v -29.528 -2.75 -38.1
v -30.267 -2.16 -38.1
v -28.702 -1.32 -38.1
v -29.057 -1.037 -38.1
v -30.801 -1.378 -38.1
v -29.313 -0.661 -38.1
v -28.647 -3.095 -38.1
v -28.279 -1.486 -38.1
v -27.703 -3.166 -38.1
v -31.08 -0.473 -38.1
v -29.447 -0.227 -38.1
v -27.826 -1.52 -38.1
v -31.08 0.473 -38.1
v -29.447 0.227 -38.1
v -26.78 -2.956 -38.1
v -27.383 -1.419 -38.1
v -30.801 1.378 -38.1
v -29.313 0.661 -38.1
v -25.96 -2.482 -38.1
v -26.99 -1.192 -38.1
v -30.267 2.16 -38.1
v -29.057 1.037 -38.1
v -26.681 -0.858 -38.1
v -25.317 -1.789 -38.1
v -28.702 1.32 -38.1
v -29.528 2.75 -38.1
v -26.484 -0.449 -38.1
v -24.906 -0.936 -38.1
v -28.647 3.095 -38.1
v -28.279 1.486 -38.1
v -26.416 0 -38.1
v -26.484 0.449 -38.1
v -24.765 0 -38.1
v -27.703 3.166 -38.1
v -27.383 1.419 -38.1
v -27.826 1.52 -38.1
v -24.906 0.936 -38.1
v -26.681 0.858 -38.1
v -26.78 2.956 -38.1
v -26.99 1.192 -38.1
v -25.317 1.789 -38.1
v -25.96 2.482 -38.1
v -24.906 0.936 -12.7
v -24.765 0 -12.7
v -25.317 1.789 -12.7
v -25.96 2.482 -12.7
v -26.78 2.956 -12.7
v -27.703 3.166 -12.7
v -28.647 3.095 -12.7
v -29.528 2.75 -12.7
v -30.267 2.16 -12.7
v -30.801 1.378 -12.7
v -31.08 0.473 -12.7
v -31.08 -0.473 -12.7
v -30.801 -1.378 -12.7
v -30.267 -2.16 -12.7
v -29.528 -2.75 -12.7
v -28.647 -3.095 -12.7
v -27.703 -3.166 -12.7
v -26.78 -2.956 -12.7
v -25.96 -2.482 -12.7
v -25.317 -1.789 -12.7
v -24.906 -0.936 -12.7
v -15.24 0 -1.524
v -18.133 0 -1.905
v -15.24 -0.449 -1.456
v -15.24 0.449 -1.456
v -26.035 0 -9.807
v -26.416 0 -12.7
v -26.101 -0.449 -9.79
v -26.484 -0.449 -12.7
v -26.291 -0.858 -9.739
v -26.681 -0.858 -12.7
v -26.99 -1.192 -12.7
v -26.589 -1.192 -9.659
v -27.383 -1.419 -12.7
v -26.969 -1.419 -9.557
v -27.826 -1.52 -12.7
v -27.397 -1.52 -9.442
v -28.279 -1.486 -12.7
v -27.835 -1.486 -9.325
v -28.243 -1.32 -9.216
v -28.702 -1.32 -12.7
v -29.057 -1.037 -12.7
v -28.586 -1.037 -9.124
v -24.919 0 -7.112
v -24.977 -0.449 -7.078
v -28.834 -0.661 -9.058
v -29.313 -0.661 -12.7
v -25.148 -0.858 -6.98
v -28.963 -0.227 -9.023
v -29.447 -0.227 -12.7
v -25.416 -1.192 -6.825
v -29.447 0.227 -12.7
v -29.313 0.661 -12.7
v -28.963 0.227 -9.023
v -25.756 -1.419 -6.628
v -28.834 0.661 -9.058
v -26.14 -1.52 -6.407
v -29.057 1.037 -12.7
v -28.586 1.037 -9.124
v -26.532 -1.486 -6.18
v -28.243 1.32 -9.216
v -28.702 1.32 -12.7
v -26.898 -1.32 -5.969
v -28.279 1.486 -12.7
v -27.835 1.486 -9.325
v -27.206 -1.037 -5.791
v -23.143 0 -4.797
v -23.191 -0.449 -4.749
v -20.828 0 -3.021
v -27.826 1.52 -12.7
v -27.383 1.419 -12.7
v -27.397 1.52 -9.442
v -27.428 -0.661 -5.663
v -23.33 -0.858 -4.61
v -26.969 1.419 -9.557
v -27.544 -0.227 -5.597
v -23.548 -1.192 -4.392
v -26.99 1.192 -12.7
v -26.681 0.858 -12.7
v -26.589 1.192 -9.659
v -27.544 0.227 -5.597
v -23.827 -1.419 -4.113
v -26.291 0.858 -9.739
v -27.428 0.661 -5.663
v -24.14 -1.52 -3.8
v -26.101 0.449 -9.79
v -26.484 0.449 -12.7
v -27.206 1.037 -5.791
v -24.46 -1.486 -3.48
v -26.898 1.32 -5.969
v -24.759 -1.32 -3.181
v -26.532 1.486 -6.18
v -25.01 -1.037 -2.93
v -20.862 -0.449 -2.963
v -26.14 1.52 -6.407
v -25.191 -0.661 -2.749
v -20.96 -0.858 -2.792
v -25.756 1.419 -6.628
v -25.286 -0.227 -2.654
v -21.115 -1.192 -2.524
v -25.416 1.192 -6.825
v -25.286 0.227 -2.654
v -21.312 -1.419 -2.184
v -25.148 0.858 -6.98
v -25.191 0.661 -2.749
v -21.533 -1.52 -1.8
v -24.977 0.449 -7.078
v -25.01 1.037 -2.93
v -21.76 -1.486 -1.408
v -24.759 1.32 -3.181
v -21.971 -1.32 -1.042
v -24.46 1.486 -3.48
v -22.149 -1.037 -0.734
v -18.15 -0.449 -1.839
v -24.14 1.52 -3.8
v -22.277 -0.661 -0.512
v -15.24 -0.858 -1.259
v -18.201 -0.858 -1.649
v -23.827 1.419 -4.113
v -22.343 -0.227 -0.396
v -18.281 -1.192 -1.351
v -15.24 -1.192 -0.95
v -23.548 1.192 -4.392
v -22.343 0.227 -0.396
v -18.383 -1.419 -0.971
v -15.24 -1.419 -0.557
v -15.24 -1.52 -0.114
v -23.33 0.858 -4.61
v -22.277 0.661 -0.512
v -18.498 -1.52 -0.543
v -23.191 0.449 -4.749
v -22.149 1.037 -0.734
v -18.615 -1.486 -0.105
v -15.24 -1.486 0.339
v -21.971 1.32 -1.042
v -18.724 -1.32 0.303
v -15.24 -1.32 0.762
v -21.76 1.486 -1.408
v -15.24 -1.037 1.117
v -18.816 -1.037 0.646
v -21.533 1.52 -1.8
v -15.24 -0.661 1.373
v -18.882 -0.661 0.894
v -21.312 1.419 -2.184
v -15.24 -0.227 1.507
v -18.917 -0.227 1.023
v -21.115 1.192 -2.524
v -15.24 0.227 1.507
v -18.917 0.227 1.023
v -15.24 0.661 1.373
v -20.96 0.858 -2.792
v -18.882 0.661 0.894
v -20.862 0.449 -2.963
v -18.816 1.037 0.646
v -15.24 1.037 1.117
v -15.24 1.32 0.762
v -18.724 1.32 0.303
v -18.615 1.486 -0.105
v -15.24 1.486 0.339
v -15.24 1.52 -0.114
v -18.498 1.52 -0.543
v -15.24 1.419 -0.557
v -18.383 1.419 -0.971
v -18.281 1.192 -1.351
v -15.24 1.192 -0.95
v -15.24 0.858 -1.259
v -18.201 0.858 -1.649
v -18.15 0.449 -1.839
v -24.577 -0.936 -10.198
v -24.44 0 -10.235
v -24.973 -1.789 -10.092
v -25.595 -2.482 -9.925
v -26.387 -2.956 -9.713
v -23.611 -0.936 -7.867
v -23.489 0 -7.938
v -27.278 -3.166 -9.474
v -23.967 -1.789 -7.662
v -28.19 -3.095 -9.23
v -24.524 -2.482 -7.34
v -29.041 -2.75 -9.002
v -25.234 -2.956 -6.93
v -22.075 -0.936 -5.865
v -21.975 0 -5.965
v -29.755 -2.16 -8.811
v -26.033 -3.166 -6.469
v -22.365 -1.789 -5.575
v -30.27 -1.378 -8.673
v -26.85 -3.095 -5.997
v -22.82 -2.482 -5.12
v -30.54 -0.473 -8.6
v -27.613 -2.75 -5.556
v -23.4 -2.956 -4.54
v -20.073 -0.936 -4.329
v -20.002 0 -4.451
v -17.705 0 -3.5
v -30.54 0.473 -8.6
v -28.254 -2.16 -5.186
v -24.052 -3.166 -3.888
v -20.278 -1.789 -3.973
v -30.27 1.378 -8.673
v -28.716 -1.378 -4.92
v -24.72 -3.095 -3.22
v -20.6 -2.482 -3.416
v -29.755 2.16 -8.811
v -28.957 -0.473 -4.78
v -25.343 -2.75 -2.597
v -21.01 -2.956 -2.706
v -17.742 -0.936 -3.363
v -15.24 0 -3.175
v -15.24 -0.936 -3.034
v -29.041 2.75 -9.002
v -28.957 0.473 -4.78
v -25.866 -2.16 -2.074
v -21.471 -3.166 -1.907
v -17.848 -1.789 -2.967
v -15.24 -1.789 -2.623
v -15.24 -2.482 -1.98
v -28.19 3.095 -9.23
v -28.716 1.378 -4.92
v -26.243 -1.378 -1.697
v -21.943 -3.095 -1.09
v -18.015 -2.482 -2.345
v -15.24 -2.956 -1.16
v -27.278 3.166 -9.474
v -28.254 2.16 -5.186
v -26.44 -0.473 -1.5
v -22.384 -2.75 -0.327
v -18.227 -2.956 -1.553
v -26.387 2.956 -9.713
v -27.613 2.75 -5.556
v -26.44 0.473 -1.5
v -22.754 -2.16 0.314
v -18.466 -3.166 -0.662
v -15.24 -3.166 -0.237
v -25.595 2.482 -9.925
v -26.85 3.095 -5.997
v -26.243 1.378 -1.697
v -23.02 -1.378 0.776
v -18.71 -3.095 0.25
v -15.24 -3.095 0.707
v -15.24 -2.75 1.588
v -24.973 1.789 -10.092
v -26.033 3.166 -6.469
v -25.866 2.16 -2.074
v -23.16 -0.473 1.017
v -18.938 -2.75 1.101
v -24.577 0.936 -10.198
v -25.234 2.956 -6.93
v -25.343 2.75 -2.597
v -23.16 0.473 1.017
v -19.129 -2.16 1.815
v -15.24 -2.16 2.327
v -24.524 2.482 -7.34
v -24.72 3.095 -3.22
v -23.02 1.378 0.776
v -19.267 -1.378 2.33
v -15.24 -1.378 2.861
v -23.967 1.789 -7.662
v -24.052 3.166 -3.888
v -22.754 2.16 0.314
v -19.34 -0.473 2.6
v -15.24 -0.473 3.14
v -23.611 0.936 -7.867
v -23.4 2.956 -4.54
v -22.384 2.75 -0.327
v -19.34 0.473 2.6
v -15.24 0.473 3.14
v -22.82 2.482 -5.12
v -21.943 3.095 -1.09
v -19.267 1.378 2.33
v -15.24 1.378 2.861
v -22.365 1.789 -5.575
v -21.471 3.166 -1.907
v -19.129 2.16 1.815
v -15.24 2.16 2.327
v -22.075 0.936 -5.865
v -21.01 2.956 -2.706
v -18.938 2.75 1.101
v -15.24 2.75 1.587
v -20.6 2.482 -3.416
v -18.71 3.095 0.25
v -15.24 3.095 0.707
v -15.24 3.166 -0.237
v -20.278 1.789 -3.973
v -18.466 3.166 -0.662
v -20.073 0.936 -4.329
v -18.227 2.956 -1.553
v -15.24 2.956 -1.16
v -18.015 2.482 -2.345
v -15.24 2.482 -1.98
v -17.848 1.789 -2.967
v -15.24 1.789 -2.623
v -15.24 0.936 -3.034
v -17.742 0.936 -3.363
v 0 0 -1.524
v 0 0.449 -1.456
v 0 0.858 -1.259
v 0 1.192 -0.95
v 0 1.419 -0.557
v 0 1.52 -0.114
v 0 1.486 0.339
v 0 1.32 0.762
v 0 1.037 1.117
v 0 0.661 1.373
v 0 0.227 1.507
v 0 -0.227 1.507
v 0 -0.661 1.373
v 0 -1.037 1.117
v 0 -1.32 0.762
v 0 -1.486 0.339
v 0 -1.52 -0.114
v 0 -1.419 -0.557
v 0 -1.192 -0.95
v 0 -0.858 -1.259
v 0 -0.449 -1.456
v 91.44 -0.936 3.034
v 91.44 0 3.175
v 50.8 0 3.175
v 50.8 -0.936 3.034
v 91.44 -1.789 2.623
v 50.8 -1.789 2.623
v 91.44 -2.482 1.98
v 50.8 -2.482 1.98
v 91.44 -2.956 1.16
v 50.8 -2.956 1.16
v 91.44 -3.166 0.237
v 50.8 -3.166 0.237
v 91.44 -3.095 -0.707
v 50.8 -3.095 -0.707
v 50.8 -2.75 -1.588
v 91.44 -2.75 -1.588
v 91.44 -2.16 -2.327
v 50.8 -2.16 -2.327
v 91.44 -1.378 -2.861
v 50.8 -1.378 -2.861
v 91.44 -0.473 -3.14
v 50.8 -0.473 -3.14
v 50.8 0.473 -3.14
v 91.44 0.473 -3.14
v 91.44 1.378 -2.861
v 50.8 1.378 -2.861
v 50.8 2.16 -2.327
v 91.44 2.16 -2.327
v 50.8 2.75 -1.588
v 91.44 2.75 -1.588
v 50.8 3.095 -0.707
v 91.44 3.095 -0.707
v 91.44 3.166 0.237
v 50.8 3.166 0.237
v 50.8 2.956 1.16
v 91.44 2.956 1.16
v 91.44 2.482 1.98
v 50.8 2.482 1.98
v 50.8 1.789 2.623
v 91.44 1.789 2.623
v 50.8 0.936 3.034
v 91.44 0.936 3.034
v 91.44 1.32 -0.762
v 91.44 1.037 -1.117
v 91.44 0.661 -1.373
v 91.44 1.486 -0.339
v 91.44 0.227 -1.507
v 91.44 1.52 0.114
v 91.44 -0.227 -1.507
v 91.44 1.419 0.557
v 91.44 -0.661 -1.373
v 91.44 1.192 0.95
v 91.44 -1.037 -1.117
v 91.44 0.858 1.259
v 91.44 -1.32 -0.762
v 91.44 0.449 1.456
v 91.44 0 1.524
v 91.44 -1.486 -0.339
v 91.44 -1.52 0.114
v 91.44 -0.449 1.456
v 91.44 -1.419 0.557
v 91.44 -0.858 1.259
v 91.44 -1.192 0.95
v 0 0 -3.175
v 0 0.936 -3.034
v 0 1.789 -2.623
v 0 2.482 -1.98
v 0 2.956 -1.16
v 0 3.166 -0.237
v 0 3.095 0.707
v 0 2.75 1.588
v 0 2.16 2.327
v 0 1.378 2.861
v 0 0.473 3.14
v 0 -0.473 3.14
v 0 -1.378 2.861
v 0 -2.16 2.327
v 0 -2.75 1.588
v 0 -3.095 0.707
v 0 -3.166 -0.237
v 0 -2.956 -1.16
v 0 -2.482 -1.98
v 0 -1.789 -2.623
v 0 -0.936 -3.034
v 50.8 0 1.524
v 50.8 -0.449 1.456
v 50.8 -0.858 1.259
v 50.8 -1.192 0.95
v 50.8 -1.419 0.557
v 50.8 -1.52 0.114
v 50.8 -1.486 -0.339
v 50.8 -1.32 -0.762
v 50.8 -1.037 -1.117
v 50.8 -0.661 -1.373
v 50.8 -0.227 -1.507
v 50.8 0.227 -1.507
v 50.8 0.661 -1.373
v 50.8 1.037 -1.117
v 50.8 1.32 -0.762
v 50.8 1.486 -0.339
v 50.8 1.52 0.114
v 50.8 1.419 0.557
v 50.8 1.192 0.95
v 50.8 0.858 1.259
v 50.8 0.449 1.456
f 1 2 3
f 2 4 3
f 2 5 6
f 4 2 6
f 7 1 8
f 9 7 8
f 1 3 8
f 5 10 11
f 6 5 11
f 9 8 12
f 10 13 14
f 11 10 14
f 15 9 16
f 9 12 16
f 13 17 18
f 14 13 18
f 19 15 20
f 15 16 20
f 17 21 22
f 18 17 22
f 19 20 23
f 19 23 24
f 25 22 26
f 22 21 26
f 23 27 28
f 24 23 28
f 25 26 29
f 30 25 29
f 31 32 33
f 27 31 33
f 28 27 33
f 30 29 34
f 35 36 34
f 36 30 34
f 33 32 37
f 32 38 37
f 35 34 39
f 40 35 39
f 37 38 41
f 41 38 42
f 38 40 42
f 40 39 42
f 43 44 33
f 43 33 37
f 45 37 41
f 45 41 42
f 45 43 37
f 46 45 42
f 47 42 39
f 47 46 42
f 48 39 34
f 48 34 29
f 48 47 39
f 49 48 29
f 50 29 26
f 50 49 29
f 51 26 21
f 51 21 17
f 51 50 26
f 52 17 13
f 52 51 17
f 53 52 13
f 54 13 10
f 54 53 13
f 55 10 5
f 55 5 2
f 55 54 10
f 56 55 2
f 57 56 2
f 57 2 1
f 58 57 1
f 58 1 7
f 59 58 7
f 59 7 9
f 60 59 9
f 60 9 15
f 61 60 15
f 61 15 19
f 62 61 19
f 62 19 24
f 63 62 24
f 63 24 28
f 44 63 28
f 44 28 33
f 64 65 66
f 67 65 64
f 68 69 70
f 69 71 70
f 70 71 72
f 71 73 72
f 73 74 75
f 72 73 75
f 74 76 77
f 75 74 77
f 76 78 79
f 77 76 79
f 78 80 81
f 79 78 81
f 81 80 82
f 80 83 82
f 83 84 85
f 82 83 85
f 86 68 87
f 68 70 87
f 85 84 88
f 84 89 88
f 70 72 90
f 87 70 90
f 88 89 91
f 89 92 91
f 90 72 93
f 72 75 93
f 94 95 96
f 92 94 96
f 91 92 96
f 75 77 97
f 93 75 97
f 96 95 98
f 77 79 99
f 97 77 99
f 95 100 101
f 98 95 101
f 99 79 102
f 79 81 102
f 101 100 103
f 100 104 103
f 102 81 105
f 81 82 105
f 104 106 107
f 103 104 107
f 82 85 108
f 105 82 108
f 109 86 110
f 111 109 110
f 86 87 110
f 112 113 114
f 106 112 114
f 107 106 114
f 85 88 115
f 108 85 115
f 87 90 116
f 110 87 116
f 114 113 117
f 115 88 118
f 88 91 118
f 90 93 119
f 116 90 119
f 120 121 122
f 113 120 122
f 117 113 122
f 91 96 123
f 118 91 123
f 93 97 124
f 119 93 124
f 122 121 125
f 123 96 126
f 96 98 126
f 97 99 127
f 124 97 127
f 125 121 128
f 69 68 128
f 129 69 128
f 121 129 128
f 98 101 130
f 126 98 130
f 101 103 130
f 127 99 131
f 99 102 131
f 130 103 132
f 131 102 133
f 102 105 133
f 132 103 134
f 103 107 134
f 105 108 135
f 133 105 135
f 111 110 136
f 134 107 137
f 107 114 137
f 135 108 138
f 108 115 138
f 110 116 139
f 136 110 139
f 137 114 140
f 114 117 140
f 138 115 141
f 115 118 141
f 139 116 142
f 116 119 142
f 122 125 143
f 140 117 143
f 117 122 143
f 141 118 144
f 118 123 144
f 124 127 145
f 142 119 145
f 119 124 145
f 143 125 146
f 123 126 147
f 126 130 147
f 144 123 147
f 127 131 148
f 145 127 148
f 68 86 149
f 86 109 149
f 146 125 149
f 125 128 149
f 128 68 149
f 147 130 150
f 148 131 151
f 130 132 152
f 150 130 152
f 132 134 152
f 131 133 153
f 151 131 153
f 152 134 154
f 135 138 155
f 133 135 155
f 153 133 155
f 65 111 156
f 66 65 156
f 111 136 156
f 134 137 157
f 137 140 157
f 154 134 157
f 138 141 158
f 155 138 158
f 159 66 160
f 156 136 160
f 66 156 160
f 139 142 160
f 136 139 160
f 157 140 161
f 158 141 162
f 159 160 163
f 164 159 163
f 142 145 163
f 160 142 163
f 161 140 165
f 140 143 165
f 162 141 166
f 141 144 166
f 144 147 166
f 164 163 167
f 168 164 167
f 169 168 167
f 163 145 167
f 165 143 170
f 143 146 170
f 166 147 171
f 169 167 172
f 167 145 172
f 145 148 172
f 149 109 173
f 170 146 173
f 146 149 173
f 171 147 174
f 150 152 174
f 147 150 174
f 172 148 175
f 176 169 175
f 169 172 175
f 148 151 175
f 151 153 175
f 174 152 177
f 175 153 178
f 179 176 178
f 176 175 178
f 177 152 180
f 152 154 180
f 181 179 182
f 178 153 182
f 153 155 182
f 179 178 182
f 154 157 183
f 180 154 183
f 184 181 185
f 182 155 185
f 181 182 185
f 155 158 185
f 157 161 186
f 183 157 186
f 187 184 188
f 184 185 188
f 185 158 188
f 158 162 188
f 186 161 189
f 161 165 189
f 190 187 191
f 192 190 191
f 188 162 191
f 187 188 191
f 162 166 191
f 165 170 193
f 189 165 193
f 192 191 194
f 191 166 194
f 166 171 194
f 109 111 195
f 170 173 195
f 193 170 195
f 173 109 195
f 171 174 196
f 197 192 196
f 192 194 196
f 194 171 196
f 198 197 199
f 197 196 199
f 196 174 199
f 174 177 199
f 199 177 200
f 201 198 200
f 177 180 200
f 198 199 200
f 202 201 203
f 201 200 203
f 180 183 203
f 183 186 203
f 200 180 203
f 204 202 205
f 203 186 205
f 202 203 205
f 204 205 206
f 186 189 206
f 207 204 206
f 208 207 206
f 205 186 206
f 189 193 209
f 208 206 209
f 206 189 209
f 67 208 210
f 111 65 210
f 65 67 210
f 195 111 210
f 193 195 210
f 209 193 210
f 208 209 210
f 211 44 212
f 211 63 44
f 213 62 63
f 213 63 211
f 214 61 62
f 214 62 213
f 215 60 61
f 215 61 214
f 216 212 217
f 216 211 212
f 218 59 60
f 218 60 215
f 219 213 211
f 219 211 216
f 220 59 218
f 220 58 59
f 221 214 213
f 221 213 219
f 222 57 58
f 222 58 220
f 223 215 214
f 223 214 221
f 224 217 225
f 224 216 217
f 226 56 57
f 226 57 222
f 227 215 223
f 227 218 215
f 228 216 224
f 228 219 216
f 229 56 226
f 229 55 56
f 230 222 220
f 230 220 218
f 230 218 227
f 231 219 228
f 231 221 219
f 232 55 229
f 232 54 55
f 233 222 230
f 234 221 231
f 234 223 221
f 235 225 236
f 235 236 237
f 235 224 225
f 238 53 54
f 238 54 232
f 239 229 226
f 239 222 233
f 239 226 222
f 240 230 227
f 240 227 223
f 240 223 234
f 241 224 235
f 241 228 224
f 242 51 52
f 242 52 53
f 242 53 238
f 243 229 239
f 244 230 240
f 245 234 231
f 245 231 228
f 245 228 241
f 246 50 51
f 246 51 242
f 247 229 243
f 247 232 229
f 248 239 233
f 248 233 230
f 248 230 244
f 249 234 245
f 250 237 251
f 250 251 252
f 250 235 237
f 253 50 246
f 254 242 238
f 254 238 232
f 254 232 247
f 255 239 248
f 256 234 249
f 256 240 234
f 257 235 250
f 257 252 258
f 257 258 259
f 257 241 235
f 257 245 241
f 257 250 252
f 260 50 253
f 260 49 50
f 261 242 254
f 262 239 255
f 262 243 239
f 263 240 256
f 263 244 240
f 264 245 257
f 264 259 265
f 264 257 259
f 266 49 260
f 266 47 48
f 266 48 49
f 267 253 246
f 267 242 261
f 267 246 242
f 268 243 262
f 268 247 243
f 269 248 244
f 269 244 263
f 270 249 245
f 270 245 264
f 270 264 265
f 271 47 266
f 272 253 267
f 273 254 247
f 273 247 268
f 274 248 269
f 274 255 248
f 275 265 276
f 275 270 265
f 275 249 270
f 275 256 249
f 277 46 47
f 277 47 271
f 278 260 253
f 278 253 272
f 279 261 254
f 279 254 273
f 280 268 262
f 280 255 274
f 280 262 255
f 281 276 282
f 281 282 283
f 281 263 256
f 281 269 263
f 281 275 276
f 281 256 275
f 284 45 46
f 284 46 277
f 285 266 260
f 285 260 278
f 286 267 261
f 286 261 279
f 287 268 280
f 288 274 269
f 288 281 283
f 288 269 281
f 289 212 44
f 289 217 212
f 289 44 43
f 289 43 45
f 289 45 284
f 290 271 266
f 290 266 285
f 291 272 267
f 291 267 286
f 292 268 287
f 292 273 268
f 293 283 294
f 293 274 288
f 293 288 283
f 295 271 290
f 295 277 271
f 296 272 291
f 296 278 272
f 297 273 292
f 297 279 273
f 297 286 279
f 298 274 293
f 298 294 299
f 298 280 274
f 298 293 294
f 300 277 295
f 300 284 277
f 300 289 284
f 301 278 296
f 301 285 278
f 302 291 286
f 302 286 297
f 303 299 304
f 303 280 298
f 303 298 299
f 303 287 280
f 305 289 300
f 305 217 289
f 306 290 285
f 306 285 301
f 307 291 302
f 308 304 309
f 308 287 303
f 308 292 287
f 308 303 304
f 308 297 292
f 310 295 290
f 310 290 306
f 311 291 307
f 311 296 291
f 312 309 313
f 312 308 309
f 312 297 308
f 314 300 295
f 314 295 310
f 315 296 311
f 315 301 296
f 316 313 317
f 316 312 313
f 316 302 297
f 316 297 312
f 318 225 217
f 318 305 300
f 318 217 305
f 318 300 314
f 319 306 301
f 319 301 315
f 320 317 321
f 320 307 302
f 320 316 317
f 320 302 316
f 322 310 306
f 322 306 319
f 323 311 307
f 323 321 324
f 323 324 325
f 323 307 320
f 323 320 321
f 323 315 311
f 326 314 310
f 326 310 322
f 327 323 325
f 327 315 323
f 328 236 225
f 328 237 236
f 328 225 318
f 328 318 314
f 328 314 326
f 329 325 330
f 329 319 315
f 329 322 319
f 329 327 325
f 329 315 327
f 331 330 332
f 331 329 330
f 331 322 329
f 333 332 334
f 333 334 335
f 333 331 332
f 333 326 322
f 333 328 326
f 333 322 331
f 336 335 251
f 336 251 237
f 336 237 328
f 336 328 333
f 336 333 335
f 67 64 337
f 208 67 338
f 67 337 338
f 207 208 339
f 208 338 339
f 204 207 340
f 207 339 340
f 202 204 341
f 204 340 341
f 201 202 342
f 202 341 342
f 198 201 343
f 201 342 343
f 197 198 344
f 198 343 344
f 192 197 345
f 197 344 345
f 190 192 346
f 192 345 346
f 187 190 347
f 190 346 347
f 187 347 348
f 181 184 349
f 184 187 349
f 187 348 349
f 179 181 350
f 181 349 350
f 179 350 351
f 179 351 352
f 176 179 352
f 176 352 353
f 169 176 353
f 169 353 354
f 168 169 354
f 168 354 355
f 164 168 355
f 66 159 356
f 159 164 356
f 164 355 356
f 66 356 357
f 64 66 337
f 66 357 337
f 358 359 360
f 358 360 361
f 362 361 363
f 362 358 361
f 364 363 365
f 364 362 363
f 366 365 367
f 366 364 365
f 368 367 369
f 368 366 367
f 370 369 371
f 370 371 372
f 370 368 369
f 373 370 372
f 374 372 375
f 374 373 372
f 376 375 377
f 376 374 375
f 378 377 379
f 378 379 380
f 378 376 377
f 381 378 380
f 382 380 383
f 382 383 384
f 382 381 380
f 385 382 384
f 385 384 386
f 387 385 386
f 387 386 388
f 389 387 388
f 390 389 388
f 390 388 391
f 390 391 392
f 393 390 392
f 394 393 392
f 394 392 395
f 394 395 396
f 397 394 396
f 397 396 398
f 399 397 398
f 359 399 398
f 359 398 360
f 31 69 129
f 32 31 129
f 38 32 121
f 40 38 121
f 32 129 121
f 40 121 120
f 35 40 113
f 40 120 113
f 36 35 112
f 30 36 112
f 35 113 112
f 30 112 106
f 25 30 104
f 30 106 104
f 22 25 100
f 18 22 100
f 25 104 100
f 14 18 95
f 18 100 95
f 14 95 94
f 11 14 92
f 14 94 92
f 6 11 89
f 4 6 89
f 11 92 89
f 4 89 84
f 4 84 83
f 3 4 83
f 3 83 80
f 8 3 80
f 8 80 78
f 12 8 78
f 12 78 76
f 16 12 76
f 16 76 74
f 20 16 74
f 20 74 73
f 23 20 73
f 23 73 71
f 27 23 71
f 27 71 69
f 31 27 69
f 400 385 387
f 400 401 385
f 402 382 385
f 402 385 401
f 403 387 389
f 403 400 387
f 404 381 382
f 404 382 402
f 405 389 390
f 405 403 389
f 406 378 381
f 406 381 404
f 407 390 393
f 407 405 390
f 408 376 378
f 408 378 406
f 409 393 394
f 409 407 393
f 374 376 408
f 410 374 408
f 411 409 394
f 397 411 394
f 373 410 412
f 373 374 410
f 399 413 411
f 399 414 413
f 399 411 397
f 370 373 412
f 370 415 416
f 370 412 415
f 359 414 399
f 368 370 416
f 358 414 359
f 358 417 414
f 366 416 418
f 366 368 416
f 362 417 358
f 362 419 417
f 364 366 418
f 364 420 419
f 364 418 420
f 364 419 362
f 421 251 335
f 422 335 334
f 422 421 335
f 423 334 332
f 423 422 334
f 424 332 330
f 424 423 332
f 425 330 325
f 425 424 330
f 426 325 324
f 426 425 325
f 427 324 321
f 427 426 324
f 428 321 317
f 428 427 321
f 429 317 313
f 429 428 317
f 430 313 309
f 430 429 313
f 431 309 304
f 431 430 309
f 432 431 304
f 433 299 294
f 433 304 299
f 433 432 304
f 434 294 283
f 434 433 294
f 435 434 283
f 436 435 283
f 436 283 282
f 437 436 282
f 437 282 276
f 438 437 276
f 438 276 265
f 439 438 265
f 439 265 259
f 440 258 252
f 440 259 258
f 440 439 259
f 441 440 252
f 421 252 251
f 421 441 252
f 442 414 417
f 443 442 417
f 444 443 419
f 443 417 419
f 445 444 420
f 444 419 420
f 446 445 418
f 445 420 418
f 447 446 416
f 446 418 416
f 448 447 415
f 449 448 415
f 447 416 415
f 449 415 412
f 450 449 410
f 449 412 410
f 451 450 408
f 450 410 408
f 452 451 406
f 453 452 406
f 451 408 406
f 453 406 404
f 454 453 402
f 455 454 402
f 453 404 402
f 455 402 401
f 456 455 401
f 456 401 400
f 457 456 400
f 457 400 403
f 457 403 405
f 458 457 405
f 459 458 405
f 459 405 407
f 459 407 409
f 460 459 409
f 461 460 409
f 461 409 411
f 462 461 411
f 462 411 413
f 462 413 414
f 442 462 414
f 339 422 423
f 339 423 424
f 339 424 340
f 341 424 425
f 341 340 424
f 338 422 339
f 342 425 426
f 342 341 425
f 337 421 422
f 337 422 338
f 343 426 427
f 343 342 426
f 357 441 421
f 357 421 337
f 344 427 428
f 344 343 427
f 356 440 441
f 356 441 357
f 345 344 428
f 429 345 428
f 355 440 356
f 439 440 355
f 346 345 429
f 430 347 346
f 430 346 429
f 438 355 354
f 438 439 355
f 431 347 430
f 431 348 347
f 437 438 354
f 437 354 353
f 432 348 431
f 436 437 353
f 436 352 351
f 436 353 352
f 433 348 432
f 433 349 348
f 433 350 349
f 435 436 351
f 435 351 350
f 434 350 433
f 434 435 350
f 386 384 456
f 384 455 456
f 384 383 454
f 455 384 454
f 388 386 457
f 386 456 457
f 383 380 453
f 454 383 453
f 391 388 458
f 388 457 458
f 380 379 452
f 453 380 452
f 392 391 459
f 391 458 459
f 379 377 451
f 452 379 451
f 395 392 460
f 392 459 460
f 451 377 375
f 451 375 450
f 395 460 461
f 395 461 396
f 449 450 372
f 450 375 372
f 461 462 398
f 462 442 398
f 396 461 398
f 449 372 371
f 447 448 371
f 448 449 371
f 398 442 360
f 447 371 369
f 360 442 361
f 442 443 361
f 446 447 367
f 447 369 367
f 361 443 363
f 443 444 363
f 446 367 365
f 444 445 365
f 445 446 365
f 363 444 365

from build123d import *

# Parameters (mm, degrees)
SWEEP_THIN1_PROFILE_R   = 3.175
SWEEP_THIN1_PROFILE_R_2 = 1.524
SWEEP_THIN2_PROFILE_R   = 3.175
SWEEP_THIN2_PROFILE_R_2 = 1.524


with BuildPart() as part:
    # Sweep-Thin1: sweep along a path in Sketch1
    with BuildLine(Plane(origin=(0, 0, 0), x_dir=(1, 0, 0), z_dir=(0, 1, 0))) as sweep_thin1_path:
        Line((-27.94, 38.1), (-27.94, 12.7))
        ThreePointArc((-27.94, 12.7), (-24.220256121, 3.719743879), (-15.24, 0))
        Line((-15.24, 0), (0, 0))
    # Sweep-Thin1 profile (on start of the path) → Sweep-Thin1 (sweep)
    with BuildSketch(Plane(origin=(-27.94, 0, -38.1), x_dir=(1, 0, 0), z_dir=(0, 0, 1))):
        Circle(SWEEP_THIN1_PROFILE_R)
        Circle(SWEEP_THIN1_PROFILE_R_2, mode=Mode.SUBTRACT)
    sweep(path=sweep_thin1_path.line)


with BuildPart() as body_2:
    # Sweep-Thin2: sweep along a path in Sketch15
    with BuildLine(Plane(origin=(0, 0, 0), x_dir=(1, 0, 0), z_dir=(0, 1, 0))) as sweep_thin2_path:
        Line((50.8, 0), (91.44, 0))
    # Sweep-Thin2 profile (on start of the path) → Sweep-Thin2 (sweep)
    with BuildSketch(Plane(origin=(50.8, 0, 0), x_dir=(0, 0, 1), z_dir=(1, 0, 0))):
        Circle(SWEEP_THIN2_PROFILE_R)
        Circle(SWEEP_THIN2_PROFILE_R_2, mode=Mode.SUBTRACT)
    sweep(path=sweep_thin2_path.line)


solid = Compound([part.part, body_2.part])
